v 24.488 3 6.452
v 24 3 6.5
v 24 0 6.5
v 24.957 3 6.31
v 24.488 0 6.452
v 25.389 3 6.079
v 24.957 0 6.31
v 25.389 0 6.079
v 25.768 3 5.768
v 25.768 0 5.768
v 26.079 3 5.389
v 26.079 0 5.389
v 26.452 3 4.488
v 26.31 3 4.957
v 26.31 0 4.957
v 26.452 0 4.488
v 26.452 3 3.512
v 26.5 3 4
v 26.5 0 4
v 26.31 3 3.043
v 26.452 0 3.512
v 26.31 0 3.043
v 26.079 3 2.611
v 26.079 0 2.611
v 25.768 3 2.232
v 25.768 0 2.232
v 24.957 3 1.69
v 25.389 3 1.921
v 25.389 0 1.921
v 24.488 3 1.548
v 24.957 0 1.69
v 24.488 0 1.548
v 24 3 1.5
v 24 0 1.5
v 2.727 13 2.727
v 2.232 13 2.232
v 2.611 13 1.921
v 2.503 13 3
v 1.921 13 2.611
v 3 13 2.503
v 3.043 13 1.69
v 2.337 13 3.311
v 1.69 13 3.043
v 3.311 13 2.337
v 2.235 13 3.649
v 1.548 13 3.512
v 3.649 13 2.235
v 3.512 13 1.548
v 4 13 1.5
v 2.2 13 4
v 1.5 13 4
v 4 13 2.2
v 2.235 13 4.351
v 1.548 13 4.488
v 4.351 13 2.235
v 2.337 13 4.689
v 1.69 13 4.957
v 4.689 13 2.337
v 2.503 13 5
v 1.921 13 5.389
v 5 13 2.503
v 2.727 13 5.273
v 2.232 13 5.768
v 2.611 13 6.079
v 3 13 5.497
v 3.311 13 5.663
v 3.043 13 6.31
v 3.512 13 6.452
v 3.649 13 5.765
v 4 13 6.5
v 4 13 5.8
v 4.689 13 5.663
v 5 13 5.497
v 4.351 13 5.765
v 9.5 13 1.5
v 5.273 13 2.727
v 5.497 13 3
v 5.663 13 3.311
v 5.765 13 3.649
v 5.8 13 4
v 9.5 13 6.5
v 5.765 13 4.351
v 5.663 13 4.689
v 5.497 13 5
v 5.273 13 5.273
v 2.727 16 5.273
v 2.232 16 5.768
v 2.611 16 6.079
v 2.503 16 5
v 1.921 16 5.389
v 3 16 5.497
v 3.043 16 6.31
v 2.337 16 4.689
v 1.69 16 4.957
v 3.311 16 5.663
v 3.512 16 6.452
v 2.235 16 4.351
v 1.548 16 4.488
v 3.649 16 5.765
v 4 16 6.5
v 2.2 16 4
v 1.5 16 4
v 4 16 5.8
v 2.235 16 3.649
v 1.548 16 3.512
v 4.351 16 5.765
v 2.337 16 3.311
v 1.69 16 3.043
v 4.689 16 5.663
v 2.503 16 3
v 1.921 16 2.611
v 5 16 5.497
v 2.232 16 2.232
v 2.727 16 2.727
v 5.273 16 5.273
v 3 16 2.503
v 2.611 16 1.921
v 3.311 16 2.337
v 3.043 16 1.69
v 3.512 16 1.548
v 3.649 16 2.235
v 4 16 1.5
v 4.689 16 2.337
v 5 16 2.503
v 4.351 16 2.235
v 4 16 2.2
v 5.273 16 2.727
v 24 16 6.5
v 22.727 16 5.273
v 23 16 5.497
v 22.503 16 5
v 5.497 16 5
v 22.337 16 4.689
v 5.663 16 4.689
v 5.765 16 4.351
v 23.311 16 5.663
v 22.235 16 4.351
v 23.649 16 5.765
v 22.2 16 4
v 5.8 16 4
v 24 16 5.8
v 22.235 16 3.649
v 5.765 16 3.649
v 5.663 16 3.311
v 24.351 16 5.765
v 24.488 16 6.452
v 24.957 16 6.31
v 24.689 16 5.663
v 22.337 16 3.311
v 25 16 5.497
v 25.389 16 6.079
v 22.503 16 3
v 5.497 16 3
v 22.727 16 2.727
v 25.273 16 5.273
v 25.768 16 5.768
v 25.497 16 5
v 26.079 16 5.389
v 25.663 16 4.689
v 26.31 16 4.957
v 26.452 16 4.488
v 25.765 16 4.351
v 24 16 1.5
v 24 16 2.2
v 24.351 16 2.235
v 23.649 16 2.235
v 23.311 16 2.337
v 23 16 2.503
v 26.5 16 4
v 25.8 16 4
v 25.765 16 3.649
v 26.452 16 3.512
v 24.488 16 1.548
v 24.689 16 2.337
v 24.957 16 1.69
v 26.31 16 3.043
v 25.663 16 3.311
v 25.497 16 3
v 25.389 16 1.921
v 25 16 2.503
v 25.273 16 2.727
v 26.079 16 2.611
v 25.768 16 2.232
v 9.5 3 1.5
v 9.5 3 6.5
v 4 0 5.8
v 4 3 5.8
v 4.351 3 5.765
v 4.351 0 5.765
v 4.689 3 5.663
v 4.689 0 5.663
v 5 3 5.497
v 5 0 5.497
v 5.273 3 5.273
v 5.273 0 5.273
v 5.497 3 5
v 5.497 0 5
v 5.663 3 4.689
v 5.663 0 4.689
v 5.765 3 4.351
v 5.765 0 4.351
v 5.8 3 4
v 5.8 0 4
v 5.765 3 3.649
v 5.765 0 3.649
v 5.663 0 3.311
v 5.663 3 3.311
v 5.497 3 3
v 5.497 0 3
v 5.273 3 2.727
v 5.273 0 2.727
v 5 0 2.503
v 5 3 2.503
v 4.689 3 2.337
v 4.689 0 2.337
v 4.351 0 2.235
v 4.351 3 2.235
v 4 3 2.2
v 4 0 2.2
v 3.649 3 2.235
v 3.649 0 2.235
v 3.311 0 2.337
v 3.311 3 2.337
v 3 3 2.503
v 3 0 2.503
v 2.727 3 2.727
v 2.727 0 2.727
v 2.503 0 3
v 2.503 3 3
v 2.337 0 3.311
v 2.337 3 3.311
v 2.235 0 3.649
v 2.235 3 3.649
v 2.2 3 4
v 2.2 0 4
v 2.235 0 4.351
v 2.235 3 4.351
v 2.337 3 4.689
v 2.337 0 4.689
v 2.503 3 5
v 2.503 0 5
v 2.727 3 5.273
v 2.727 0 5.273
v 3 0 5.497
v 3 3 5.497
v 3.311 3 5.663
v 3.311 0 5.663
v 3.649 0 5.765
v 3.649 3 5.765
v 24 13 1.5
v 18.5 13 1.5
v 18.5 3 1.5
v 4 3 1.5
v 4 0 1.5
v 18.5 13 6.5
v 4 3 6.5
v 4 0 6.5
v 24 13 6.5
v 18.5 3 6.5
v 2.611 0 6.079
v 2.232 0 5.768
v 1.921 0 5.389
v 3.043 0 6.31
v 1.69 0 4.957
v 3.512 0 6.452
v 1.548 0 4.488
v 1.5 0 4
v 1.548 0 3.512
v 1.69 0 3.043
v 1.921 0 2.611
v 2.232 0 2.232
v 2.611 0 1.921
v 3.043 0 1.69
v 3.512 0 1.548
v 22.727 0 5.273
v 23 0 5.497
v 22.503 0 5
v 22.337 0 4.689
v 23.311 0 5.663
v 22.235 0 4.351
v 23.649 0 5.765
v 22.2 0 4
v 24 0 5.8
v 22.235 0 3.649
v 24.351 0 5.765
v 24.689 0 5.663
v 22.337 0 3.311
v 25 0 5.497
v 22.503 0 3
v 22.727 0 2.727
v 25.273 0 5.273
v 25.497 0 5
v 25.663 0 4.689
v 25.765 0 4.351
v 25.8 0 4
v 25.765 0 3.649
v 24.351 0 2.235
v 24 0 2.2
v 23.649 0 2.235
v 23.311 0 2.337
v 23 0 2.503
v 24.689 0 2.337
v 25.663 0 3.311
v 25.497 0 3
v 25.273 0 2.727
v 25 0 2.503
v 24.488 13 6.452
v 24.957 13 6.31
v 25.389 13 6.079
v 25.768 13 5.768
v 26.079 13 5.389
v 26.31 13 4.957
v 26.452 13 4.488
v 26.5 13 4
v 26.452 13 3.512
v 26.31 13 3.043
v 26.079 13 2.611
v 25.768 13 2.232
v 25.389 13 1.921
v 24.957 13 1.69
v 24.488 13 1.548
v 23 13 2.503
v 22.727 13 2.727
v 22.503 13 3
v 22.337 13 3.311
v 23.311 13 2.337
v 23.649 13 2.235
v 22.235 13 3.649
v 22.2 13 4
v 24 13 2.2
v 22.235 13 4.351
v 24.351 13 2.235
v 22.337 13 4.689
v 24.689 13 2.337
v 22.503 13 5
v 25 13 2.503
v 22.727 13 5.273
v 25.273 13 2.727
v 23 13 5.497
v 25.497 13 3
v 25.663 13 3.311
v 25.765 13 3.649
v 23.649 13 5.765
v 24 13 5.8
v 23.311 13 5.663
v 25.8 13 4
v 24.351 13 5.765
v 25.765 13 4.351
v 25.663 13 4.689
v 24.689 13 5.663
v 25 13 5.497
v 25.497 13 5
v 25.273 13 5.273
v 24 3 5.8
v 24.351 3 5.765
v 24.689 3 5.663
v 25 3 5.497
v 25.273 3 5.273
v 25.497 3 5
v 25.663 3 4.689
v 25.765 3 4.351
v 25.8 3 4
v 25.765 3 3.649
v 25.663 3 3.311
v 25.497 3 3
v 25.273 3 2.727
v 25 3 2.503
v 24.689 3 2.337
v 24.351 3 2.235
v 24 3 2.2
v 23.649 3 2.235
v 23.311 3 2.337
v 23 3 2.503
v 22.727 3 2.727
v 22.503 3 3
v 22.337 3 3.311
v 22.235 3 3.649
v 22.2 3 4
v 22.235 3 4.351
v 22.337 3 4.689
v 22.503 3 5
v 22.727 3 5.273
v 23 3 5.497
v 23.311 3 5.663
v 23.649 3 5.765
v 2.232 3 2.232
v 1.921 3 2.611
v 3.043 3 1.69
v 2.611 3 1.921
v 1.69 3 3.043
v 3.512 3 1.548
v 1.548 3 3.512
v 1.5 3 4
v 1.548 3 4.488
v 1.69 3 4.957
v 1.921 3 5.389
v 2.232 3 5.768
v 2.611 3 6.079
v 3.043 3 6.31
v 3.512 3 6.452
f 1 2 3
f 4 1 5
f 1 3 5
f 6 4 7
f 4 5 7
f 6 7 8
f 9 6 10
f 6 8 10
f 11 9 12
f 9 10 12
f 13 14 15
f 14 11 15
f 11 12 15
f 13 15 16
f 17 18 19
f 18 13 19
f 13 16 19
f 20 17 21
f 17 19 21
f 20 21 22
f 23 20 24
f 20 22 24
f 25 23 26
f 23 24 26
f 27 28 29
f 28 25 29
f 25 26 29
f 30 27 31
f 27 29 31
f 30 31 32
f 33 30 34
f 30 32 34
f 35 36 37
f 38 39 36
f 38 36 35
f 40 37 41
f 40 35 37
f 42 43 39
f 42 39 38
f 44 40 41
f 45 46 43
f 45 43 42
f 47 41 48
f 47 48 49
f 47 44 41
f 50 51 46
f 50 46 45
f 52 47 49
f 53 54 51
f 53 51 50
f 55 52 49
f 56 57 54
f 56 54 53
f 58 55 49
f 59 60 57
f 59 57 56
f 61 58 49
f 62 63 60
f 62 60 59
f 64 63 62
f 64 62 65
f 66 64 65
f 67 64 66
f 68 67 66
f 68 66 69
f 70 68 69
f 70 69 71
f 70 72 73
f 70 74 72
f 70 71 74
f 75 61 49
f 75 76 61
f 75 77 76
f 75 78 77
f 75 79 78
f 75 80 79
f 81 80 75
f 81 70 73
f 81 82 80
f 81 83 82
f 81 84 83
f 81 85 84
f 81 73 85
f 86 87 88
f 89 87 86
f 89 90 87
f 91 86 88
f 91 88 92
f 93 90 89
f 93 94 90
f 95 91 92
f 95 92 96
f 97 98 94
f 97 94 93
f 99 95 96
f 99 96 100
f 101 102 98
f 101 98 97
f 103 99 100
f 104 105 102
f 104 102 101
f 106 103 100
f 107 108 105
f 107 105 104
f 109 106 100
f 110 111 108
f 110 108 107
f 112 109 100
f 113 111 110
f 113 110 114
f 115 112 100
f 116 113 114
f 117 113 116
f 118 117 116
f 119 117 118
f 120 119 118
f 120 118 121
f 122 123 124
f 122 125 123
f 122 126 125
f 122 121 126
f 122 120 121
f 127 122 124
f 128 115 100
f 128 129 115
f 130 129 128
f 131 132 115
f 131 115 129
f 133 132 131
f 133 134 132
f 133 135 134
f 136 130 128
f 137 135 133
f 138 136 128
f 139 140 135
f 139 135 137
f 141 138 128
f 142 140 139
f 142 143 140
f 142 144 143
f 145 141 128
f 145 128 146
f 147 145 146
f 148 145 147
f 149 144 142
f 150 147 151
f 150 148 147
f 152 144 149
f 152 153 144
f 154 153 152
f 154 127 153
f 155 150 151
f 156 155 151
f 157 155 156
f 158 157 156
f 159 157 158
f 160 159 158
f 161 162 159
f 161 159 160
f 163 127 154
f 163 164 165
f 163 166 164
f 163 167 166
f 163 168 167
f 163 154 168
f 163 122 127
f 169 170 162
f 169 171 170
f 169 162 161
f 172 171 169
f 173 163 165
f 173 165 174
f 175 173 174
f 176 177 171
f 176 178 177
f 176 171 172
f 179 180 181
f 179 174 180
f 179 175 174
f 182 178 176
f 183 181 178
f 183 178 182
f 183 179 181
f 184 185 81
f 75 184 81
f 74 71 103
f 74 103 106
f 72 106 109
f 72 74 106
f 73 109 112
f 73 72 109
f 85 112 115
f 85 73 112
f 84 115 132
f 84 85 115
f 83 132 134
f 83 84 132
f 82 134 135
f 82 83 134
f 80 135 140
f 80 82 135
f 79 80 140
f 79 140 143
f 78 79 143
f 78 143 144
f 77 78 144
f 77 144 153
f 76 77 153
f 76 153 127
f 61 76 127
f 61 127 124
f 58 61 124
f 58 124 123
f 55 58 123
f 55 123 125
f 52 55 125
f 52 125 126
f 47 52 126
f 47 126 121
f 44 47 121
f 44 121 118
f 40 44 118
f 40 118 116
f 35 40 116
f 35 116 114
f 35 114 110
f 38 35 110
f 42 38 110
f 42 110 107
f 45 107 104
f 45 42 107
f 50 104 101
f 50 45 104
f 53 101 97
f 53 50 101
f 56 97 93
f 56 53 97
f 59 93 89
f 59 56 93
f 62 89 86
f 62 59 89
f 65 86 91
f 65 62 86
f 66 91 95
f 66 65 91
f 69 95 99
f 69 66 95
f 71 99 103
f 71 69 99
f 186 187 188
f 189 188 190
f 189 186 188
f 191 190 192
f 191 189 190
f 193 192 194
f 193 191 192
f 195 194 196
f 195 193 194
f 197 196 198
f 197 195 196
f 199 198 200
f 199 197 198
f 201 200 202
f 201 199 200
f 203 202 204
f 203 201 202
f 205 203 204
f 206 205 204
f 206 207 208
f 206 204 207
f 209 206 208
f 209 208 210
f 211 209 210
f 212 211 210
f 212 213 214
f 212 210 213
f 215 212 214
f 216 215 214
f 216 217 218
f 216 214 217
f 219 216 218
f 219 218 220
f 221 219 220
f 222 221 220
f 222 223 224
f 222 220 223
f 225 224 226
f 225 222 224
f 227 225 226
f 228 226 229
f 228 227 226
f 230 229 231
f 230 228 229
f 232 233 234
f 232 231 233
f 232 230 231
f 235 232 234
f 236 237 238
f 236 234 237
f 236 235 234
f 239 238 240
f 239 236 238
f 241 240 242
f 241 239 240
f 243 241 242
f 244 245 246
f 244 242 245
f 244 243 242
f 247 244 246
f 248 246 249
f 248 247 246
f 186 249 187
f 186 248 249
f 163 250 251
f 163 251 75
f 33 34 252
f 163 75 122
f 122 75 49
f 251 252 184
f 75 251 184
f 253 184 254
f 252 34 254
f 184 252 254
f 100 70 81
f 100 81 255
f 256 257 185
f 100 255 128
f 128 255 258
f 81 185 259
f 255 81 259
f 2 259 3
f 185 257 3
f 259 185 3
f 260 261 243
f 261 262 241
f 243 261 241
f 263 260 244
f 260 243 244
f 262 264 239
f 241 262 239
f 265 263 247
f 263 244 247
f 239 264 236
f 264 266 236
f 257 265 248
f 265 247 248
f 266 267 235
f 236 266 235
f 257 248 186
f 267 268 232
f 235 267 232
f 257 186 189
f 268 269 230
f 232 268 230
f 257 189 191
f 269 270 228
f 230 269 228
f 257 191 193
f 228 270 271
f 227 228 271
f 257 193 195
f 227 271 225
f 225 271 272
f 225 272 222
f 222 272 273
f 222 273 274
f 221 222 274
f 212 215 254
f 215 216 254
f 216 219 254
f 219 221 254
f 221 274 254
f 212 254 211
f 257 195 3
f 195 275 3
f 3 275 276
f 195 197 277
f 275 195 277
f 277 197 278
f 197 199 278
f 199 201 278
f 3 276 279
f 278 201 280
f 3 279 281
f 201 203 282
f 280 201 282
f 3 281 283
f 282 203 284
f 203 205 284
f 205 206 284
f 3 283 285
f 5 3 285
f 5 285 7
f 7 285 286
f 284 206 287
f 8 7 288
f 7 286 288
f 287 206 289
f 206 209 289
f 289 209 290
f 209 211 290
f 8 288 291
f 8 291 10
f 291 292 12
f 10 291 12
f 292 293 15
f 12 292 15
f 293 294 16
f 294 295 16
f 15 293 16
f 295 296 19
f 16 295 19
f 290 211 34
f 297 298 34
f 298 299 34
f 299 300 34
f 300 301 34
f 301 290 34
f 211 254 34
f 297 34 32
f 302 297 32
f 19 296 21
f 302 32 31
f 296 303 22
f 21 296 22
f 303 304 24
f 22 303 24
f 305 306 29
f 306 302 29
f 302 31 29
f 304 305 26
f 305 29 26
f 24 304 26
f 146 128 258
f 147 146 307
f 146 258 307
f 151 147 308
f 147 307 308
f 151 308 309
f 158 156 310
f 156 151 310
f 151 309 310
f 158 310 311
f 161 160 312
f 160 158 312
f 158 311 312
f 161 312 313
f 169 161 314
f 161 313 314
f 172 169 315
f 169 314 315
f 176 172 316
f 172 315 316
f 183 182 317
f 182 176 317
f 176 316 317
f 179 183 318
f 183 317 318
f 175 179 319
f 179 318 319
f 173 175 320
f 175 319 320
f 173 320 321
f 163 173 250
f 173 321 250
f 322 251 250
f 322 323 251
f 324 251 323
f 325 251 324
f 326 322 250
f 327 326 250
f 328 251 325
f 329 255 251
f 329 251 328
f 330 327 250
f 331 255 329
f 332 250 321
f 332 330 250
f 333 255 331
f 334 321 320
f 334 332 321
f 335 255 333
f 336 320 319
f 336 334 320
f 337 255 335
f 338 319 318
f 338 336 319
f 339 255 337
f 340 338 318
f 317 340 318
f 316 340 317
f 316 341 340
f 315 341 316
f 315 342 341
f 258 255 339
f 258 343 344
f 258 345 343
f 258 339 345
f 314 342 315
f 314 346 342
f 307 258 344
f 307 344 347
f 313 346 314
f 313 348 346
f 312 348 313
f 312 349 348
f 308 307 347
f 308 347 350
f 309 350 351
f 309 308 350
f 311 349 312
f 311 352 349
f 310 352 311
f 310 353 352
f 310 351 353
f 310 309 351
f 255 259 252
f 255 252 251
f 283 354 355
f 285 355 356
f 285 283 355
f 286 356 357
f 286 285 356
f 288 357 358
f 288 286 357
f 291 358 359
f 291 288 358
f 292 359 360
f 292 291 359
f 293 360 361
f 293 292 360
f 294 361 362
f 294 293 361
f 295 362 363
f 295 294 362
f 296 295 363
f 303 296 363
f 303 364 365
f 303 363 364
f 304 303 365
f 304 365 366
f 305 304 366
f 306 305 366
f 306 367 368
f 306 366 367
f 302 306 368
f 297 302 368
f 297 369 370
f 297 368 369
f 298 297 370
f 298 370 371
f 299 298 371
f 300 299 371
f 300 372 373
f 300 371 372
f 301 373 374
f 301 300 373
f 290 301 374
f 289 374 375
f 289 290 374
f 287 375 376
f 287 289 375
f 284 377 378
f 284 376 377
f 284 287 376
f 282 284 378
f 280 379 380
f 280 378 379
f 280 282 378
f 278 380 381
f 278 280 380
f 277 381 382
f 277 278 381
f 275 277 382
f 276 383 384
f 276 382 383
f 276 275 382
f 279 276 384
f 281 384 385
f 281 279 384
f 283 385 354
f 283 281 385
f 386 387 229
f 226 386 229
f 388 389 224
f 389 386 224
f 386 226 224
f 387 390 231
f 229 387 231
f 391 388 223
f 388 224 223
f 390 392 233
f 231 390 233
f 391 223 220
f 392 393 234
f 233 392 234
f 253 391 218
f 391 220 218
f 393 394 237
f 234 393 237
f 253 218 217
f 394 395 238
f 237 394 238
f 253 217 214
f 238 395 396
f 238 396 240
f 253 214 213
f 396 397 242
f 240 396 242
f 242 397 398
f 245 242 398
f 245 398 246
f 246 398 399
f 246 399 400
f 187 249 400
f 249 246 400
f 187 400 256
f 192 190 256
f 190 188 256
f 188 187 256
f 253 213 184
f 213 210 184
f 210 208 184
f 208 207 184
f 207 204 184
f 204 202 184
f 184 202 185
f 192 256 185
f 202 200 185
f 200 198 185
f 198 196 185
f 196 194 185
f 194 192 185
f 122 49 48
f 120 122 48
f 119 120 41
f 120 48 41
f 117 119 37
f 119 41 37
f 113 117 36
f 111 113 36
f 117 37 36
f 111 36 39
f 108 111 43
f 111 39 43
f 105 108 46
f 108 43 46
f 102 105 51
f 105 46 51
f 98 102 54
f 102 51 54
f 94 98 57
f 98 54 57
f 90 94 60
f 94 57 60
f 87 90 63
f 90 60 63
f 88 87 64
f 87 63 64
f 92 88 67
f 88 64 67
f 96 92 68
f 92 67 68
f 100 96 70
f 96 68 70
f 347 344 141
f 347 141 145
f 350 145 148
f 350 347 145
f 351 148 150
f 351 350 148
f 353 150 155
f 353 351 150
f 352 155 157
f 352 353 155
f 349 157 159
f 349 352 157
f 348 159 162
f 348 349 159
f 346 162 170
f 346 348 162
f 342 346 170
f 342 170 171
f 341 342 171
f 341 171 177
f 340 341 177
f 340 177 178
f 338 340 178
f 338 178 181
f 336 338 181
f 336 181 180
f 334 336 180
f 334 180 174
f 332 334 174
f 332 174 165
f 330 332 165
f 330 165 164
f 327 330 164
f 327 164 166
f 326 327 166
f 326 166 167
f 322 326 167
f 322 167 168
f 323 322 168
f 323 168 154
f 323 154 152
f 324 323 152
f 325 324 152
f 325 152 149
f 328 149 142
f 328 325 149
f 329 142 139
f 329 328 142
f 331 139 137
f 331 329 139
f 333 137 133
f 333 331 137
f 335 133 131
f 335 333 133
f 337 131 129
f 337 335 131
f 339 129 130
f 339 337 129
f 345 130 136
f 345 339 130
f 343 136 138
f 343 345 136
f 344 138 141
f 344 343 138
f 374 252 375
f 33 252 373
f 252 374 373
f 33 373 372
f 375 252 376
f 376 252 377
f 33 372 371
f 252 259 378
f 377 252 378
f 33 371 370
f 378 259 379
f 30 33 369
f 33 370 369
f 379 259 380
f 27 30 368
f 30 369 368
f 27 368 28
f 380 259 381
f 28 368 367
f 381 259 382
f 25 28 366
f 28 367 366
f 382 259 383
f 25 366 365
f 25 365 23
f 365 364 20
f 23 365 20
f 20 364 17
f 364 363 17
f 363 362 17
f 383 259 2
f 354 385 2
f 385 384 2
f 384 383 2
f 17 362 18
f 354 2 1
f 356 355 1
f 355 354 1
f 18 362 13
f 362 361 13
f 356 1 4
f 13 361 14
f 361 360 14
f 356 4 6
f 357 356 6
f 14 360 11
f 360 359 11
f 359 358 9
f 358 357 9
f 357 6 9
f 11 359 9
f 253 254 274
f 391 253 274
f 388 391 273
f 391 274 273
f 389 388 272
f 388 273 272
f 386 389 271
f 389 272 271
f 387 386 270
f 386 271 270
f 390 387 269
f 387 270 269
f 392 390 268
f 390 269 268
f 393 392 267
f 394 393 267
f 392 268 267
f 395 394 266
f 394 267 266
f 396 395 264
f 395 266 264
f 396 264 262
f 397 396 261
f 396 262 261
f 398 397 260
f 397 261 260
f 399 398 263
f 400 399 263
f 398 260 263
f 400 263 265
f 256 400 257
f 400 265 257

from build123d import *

# Parameters (mm, degrees)
SKETCH_1_R          = 2.5
SKETCH_1_R_2        = 1.8
EXTRUDE_1_DEPTH     = 16
CUT_EXTRUDE_1_REACH = 33.357
SKETCH_2_W          = 8
SKETCH_2_H          = 10


with BuildPart() as part:
    # 草图1 → 凸台-拉伸1 (new body)
    # profile 1 of 3: a face of its own
    with BuildSketch(Plane(origin=(0, 0, 0), x_dir=(1, 0, 0), z_dir=(0, 1, 0))):
        with BuildLine():
            Line((24, -1.5), (4, -1.5))
            ThreePointArc((4, -1.5), (5.767766953, -2.232233047), (6.5, -4))
            ThreePointArc((6.5, -4), (5.767766953, -5.767766953), (4, -6.5))
            Line((4, -6.5), (24, -6.5))
            ThreePointArc((24, -6.5), (21.5, -4), (24, -1.5))
        make_face()
    # profile 2 of 3: a face of its own
    with BuildSketch(Plane(origin=(0, 0, 0), x_dir=(1, 0, 0), z_dir=(0, 1, 0))):
        with Locations((4, -4)):
            Circle(SKETCH_1_R)
        with Locations(Location((4, -4, 0), (0, 0, 270))):
            Circle(SKETCH_1_R_2, mode=Mode.SUBTRACT)
    # profile 3 of 3: a face of its own
    with BuildSketch(Plane(origin=(0, 0, 0), x_dir=(1, 0, 0), z_dir=(0, 1, 0))):
        with Locations((24, -4)):
            Circle(SKETCH_1_R)
        with Locations(Location((24, -4, 0), (0, 0, 270))):
            Circle(SKETCH_1_R_2, mode=Mode.SUBTRACT)
    extrude(amount=EXTRUDE_1_DEPTH)

    # 草图2 → 切除-拉伸1 (cut, up to next)
    with BuildSketch(Plane.XY.offset(6.5), mode=Mode.PRIVATE) as cut_extrude_1_sk1:
        with Locations((22.5, 8)):
            Rectangle(SKETCH_2_W, SKETCH_2_H)
    cut_extrude_1_tool1 = extrude(cut_extrude_1_sk1.sketch, amount=-CUT_EXTRUDE_1_REACH, mode=Mode.PRIVATE) & part.part
    # 草图2 → 切除-拉伸1 (cut, up to next)
    with BuildSketch(Plane.XY.offset(6.5), mode=Mode.PRIVATE) as cut_extrude_1_sk2:
        with Locations((5.5, 8)):
            Rectangle(SKETCH_2_W, SKETCH_2_H)
    cut_extrude_1_tool2 = extrude(cut_extrude_1_sk2.sketch, amount=-CUT_EXTRUDE_1_REACH, mode=Mode.PRIVATE) & part.part
    add(cut_extrude_1_tool1.solids().sort_by_distance((22.5, 8, 6.5))[0], mode=Mode.SUBTRACT)
    add(cut_extrude_1_tool2.solids().sort_by_distance((5.5, 8, 6.5))[0], mode=Mode.SUBTRACT)


solid = part.part
